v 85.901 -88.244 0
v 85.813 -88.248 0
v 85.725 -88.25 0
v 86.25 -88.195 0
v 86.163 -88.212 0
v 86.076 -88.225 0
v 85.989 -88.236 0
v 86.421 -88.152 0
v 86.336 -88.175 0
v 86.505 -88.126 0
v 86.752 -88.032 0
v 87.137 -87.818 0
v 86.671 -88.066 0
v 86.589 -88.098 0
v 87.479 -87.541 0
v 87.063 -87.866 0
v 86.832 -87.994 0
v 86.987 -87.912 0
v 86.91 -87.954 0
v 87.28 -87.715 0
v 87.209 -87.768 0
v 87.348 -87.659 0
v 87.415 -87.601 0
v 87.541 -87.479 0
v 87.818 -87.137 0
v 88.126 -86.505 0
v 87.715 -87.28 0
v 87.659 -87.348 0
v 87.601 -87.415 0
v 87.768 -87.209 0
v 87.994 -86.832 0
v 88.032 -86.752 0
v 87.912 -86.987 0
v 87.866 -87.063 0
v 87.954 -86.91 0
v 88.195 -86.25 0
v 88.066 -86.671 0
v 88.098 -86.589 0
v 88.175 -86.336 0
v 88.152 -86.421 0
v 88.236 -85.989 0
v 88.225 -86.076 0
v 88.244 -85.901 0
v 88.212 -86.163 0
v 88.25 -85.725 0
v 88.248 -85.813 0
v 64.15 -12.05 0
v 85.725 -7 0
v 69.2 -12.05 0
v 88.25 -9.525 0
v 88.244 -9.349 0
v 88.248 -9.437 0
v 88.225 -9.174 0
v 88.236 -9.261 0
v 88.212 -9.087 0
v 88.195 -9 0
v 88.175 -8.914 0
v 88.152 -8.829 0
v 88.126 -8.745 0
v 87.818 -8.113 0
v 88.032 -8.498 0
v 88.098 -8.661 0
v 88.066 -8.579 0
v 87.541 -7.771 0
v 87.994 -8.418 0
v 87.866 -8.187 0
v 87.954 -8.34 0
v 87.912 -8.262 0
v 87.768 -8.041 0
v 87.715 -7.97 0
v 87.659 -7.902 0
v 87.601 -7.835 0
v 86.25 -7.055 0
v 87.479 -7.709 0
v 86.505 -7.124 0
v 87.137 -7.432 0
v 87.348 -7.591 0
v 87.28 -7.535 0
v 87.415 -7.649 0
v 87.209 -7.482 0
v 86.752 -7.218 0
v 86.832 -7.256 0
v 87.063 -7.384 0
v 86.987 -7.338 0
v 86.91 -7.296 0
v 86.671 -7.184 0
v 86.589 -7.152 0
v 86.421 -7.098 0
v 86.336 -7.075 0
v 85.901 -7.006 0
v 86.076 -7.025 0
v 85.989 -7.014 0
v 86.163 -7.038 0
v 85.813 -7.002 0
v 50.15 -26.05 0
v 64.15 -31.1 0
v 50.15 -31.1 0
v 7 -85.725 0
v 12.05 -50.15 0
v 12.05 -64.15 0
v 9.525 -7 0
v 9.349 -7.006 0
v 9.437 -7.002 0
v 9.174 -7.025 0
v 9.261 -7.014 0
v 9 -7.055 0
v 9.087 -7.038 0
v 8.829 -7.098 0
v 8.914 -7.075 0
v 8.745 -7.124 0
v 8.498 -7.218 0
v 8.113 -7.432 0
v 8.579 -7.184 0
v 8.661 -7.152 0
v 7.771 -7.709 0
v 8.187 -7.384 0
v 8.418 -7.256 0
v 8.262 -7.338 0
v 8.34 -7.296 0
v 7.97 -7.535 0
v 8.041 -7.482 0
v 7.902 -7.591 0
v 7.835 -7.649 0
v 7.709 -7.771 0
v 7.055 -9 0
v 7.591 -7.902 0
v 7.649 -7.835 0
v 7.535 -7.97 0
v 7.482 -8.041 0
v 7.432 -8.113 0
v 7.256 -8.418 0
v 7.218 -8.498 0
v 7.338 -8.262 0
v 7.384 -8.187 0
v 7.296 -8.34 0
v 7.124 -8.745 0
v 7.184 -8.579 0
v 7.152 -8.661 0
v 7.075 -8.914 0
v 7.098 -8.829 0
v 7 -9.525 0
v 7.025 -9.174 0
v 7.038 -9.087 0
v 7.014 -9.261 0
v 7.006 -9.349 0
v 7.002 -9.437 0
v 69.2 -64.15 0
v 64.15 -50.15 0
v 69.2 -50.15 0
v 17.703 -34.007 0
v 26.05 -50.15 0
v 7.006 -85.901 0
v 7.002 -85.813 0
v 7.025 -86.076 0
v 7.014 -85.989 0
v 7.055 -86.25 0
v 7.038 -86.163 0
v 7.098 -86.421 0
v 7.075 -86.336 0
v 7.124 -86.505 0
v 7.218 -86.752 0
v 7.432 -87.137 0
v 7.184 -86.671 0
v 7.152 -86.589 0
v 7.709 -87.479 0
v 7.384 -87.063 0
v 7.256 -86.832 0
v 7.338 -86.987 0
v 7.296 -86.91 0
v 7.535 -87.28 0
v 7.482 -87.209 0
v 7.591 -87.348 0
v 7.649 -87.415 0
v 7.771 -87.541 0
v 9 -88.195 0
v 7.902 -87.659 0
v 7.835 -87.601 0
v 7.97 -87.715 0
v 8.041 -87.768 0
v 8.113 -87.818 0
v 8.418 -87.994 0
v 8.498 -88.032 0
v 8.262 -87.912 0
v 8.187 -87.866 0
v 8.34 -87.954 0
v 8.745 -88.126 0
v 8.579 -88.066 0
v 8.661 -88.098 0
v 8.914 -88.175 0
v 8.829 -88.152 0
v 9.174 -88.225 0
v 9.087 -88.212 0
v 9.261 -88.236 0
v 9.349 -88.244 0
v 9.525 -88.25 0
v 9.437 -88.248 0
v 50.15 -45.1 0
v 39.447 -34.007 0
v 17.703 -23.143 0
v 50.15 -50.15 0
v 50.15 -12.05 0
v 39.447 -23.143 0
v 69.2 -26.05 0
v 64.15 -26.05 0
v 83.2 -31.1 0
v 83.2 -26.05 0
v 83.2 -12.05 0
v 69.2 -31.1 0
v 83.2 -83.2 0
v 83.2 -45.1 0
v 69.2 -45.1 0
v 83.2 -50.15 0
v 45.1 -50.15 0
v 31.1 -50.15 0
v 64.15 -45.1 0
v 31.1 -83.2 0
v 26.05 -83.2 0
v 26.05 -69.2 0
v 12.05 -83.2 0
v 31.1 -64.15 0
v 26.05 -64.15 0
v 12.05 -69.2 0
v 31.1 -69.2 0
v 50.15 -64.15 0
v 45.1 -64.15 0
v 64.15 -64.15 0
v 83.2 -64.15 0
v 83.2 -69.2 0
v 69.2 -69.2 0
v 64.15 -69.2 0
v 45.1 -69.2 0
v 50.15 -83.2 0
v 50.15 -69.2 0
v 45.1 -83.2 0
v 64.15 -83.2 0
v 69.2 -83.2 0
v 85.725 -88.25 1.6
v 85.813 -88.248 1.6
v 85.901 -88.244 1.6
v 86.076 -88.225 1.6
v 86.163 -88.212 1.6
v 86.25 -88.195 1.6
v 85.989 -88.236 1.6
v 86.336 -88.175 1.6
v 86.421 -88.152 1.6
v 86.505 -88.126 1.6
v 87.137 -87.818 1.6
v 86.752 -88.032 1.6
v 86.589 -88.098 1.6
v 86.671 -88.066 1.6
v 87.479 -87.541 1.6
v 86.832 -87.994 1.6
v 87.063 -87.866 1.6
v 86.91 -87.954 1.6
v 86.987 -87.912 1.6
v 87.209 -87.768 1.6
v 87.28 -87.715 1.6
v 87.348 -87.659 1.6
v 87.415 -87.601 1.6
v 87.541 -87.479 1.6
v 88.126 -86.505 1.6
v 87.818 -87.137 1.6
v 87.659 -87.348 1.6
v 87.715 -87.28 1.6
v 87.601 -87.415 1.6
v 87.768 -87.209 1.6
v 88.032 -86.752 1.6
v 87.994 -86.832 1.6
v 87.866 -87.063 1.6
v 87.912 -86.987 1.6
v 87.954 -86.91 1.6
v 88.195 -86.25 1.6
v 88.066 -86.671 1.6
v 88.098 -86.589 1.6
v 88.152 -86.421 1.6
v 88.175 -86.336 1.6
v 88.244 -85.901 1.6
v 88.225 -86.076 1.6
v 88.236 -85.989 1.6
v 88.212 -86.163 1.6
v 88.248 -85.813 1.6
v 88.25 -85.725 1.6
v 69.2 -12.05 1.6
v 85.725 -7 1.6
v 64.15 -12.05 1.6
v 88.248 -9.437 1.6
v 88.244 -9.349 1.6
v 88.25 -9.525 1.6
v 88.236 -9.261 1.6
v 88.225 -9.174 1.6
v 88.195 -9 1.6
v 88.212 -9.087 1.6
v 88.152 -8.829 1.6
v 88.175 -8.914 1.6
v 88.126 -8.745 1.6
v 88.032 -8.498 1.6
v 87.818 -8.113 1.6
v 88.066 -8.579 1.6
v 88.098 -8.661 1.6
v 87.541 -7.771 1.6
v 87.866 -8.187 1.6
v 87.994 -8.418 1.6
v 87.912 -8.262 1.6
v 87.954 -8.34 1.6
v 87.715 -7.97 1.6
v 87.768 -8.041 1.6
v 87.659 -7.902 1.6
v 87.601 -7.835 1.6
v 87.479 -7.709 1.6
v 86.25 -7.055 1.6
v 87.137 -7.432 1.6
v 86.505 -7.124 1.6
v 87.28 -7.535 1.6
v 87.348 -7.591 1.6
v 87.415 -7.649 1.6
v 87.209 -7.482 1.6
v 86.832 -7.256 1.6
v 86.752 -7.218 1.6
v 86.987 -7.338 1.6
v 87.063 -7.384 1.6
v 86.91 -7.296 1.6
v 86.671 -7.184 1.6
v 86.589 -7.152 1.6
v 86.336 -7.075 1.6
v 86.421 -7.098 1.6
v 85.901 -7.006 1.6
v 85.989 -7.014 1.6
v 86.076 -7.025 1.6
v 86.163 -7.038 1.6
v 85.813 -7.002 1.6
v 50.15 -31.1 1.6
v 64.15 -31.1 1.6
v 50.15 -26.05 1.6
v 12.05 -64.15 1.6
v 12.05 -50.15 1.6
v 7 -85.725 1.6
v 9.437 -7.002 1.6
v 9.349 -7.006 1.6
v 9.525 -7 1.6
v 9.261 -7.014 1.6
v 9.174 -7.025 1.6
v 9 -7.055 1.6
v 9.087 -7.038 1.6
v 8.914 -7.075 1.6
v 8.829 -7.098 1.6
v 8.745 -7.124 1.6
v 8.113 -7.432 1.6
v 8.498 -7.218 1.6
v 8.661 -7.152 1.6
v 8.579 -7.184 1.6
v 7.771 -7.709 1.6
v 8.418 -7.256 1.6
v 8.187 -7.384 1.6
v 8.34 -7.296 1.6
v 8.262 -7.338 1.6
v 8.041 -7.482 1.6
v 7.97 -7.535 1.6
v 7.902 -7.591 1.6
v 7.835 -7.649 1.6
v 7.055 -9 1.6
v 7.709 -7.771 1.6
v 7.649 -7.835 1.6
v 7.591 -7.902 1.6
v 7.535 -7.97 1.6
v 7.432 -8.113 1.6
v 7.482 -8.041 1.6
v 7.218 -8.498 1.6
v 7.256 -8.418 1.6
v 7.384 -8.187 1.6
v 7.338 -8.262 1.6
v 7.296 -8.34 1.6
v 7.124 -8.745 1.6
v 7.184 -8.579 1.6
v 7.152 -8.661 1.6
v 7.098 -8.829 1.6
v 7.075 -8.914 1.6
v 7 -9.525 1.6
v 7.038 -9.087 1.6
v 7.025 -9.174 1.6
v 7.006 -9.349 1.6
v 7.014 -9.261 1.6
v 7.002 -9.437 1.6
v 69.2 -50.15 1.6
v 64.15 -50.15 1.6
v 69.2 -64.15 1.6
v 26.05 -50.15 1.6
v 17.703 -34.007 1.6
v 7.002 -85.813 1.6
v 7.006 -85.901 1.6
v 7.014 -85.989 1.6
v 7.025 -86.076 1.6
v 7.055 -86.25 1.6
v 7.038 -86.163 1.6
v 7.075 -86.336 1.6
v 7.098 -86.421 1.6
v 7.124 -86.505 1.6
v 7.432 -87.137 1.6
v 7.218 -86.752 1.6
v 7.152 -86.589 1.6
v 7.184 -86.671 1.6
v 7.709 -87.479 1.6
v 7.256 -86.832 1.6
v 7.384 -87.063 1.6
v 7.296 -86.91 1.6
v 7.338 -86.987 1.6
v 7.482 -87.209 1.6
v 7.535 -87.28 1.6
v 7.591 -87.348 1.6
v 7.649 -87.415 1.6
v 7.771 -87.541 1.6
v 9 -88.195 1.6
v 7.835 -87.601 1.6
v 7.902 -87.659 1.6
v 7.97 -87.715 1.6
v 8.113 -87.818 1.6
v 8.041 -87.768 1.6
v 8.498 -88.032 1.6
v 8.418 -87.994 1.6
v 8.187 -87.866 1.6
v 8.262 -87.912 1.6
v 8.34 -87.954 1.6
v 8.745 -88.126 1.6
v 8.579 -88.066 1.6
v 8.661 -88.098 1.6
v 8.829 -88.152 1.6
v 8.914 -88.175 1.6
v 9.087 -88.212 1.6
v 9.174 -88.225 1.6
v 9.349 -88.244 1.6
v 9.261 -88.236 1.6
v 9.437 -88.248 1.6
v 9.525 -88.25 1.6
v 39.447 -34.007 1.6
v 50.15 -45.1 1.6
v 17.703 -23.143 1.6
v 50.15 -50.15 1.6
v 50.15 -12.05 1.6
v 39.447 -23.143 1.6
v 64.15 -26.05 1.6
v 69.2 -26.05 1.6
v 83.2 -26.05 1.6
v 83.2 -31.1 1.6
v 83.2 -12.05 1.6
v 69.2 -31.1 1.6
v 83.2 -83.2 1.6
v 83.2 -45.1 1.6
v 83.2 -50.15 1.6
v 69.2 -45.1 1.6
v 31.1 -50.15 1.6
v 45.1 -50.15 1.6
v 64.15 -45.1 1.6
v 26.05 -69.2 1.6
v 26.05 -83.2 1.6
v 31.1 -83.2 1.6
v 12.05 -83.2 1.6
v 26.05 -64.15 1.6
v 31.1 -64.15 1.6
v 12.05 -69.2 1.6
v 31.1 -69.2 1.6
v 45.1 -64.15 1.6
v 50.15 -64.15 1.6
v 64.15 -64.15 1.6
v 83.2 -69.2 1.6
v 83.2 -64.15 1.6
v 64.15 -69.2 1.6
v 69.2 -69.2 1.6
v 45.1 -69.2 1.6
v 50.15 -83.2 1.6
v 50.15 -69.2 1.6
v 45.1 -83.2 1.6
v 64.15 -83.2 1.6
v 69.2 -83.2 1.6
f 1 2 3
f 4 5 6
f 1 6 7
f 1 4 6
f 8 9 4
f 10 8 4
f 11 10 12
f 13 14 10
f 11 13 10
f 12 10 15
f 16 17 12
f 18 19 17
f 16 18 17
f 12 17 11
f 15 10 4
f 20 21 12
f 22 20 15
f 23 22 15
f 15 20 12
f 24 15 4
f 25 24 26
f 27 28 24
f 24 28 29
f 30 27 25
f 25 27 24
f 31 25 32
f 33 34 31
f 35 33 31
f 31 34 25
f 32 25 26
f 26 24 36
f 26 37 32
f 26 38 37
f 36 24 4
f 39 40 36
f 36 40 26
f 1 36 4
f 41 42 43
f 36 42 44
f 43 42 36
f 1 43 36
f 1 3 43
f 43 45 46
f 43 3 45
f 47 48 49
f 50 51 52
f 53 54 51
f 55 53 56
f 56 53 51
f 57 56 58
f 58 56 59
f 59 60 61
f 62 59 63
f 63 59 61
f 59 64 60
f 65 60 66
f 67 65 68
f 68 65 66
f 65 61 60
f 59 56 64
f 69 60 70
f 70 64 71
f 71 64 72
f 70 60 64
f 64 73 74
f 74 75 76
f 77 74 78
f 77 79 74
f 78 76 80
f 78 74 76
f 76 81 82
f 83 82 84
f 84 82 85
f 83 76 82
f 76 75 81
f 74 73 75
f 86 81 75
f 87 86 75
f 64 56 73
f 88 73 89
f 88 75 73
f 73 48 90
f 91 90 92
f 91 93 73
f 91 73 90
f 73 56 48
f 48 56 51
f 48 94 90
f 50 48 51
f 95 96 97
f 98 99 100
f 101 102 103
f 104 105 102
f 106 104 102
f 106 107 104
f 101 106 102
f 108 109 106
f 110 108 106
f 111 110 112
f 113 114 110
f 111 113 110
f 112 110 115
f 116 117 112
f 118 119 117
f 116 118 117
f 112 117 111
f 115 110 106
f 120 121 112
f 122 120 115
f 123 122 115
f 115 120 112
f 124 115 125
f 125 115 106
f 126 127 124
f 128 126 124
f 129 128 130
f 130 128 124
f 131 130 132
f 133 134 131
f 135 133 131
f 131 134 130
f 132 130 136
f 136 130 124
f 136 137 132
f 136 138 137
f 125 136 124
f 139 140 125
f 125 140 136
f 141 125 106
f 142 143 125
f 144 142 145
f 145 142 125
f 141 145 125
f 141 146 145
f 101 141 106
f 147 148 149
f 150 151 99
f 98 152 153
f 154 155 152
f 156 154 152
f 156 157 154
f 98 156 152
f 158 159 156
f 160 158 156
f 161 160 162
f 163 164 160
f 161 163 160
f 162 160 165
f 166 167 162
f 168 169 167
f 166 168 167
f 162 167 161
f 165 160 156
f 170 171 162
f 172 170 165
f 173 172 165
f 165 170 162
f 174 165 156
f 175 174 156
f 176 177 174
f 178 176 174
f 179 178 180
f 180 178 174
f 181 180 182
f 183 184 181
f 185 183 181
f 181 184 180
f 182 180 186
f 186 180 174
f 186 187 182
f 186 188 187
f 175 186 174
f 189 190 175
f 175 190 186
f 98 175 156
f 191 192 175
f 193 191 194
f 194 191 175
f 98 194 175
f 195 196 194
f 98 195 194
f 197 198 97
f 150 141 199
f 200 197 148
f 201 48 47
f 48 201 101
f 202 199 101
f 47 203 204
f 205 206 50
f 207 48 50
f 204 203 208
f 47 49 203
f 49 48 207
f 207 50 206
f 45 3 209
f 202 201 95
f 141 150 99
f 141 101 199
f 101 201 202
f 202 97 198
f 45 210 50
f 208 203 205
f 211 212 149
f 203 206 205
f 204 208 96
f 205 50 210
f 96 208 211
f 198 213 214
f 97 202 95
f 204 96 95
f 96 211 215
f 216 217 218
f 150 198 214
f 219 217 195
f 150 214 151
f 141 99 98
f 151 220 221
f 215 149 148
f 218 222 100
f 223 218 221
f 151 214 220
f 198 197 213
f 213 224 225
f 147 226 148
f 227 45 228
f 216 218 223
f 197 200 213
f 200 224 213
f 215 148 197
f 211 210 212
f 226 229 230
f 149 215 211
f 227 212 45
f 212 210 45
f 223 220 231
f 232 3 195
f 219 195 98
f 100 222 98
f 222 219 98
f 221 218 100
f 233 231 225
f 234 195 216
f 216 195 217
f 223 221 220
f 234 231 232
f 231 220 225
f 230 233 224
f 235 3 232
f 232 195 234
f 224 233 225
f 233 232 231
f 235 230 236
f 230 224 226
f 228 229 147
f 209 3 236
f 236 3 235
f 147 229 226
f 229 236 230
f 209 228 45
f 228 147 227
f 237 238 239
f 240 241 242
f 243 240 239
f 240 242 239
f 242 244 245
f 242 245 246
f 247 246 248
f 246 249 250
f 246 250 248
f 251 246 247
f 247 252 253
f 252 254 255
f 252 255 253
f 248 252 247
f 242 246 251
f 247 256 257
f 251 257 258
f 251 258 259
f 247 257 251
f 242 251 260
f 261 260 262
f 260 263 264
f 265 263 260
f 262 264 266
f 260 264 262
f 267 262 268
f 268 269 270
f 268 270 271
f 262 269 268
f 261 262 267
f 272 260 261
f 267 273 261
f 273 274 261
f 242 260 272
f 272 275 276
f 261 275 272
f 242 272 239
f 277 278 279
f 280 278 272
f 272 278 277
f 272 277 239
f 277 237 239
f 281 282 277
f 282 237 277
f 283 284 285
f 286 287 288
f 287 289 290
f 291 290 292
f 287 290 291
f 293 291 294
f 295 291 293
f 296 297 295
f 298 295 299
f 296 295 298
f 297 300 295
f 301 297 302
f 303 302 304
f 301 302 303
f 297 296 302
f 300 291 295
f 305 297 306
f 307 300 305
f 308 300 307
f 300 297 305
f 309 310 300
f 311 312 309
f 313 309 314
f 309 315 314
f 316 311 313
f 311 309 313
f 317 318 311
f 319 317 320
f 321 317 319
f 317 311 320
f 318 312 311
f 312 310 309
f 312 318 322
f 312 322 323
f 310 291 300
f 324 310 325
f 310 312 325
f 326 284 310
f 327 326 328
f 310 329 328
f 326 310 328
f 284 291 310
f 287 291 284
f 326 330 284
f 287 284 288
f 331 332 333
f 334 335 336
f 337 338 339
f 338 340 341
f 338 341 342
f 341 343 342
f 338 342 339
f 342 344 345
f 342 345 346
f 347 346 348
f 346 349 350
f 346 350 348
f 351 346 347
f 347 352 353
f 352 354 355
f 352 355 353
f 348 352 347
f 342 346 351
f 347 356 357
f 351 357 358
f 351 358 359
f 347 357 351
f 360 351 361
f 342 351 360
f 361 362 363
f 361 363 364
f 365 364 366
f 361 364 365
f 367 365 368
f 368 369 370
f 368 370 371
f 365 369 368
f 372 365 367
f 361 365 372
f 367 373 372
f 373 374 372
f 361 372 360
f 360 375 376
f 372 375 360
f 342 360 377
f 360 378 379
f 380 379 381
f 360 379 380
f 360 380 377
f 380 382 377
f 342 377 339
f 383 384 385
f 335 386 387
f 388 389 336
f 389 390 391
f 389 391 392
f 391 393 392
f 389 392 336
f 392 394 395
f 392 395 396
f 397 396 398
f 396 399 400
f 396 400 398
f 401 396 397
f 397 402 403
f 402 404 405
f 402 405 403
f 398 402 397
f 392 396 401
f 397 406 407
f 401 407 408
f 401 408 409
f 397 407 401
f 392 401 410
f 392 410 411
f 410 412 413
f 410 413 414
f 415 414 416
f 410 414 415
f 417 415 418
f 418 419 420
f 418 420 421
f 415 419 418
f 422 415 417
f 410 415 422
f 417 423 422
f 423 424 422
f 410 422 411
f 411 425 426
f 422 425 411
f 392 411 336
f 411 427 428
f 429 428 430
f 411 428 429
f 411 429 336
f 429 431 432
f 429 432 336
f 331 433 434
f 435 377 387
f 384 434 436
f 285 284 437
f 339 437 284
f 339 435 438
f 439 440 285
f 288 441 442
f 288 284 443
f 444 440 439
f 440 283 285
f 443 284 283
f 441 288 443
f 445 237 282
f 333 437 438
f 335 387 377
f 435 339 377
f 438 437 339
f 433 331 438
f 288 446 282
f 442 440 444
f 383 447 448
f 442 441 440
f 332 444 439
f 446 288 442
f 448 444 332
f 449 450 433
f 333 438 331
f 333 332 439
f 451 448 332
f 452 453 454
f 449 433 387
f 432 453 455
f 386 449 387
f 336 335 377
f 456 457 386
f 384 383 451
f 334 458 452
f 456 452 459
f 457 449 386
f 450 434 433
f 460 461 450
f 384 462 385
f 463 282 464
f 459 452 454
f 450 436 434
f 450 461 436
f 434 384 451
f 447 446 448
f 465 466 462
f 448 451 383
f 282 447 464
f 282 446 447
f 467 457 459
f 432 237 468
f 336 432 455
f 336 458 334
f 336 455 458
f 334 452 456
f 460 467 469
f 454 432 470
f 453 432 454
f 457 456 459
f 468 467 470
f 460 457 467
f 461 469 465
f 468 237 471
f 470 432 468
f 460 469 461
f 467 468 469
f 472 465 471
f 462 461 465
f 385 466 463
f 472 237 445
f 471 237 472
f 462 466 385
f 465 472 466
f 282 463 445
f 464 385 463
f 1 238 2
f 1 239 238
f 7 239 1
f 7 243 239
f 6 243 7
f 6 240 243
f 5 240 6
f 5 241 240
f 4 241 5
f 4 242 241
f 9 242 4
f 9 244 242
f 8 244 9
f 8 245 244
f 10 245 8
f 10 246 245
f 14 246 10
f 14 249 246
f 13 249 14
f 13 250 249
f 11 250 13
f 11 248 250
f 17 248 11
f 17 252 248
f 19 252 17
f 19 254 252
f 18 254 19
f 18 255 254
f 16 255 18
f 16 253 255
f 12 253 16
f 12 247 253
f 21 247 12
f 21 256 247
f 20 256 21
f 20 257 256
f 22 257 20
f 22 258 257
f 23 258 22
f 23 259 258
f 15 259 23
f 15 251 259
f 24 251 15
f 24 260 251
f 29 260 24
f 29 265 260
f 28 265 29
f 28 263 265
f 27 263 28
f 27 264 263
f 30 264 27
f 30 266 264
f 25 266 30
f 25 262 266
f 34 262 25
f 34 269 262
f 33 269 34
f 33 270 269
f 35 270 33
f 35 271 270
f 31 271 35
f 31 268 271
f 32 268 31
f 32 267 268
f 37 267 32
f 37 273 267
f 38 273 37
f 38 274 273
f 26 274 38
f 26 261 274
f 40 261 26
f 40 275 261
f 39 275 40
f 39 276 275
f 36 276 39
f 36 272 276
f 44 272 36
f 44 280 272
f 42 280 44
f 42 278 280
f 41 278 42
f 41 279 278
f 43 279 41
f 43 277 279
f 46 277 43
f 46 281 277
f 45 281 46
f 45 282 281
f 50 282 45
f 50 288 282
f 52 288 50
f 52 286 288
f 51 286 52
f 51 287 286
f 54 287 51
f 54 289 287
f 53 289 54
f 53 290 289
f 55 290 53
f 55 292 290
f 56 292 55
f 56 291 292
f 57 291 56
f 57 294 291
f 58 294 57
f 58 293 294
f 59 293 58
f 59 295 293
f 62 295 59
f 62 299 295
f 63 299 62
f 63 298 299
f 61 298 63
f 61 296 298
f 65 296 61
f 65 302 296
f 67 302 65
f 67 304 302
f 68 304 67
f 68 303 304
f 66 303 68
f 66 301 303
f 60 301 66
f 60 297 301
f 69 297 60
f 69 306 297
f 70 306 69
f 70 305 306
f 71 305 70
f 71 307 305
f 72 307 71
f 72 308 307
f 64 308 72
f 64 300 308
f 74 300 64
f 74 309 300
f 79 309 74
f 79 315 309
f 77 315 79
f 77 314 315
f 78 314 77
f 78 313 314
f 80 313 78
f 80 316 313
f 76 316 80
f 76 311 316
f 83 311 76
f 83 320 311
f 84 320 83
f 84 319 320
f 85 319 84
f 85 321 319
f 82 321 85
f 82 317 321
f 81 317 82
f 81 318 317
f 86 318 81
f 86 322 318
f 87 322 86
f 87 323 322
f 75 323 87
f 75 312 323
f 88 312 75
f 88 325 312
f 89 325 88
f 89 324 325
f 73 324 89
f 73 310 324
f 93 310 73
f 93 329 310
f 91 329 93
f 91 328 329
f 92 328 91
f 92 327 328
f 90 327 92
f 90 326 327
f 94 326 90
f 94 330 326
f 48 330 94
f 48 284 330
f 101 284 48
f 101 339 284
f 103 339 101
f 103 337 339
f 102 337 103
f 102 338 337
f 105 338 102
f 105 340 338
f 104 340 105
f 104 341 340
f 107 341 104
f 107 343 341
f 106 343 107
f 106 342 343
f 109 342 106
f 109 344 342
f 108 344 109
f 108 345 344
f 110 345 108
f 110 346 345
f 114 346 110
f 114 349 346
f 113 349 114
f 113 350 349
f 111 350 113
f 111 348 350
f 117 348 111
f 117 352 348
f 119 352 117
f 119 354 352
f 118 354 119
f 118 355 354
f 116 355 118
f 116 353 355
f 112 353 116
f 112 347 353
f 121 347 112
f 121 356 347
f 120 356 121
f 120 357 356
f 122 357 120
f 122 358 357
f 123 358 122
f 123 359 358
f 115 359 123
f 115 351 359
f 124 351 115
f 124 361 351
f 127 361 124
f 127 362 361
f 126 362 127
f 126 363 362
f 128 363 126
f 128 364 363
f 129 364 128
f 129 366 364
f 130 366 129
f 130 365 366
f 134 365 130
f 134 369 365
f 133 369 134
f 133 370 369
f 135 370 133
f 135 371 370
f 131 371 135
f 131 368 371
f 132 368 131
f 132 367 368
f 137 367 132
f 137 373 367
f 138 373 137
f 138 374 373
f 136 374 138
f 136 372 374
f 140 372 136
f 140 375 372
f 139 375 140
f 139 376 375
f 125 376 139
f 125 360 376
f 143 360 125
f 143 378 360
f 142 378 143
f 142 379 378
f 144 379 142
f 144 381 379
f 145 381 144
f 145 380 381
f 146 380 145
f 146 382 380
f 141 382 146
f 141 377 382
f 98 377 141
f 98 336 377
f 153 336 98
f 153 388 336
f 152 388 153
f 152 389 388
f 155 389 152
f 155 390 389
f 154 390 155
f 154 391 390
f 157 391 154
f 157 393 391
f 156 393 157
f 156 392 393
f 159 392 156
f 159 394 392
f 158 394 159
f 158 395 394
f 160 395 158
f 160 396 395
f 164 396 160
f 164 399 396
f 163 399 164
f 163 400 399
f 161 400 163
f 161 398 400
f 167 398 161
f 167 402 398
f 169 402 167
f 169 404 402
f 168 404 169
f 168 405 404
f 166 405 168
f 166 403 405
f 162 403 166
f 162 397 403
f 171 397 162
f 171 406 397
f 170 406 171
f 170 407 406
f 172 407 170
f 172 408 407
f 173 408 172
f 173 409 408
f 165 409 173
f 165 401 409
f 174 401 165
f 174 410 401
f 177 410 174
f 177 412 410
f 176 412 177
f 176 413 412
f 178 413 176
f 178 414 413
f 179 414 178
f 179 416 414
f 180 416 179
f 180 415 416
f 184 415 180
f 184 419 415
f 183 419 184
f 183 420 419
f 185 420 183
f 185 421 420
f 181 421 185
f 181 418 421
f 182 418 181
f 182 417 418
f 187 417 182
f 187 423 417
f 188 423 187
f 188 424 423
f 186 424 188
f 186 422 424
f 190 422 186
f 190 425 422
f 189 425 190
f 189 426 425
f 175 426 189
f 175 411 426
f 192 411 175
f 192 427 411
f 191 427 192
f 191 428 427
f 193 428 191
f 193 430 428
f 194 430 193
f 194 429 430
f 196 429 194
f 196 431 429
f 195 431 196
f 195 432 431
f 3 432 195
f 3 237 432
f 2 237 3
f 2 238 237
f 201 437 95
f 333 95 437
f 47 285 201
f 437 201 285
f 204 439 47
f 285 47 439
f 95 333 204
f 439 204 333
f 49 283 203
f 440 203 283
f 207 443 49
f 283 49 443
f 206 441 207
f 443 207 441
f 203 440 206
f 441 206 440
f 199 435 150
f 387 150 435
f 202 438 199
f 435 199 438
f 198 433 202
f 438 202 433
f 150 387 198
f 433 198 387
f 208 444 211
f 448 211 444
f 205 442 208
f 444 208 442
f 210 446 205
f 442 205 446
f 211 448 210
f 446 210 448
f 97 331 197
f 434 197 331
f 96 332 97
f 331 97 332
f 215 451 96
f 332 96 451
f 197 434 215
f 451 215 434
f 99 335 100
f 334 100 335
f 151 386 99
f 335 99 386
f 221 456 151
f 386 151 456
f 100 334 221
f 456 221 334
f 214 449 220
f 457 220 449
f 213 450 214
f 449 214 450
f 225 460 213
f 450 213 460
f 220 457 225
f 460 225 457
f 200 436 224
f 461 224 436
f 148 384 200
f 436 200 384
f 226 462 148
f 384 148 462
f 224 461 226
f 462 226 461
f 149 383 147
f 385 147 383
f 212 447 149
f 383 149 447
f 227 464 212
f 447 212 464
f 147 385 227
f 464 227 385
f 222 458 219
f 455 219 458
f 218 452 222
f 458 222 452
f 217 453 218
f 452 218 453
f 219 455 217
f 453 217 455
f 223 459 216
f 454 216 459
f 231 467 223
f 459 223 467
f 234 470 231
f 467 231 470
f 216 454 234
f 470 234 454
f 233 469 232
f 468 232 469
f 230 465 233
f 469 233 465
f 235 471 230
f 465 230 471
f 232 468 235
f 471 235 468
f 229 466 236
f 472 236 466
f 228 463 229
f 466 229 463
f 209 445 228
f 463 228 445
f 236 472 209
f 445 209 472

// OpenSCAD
// Parameters

// Number of rows

rows = 4; // [1 : 10]
columns = 4;
plate_thickness = 1.6;
oled = true; // true/false
oled_row = 1;
oled_column = 1;

bezel_width = 5.05;

quality = 50; // [1 : 100]

// Constants

cherry_size = 14;
cherry_pitch = 19.05;
$fn = quality / 100 * 360;

draw_parts();

module draw_parts() {
    plate();
}

module plate() {
    linear_extrude(plate_thickness)
        union() {
            // Draw OLED module if there is one
            if ( oled ) {
                translate([oled_column * cherry_pitch, -oled_row * cherry_pitch])
                    oled();
                }

            // Fill remaining grid with key switches
            for ( row = [1:1:rows] ) { 
                for ( column = [1:1:columns] ) {
                    translate([column * cherry_pitch, -row * cherry_pitch])
                        if ( !oled || (!((row == oled_row || row == oled_row + 1) && (column == oled_column || column == oled_column + 1))) ){
                            cherry_switch();
                        }
                }
            }
            // Add a bezel
            plate_bezel();
        }
}

module plate_bezel() {
    translate([cherry_pitch * (0.5 + (columns / 2)), -cherry_pitch/2])
        plate_bezel_section(columns);
    translate([cherry_pitch * (0.5 + (columns / 2)), -cherry_pitch * (0.5 + rows)])
        plate_bezel_section(columns);
    translate([cherry_pitch / 2, -cherry_pitch * (0.5 + (rows / 2))])
        rotate([0,0,90])
            plate_bezel_section(rows);
    translate([cherry_pitch * (0.5 + columns),  -cherry_pitch * (0.5 + (rows / 2))])
        rotate([0,0,90])
            plate_bezel_section(rows);
}

module plate_bezel_section( units = 1) {
    hull () {
        translate([cherry_pitch * units / 2, 0])
            circle(d = bezel_width);
        translate([-cherry_pitch * units / 2, 0])
            circle(d = bezel_width);
    }
}

module cherry_switch() {
    difference() {
        square([cherry_pitch + 0.01, cherry_pitch + 0.01], center = true);
        square([cherry_size, cherry_size], center = true);
    }
}

module oled() {
    translate([cherry_pitch/2, -cherry_pitch/2, 0])
        difference() {
            square([cherry_pitch*2 + 0.01, cherry_pitch*2 + 0.01], center = true);
            square([21.744, 10.864], center = true);
        }
}
